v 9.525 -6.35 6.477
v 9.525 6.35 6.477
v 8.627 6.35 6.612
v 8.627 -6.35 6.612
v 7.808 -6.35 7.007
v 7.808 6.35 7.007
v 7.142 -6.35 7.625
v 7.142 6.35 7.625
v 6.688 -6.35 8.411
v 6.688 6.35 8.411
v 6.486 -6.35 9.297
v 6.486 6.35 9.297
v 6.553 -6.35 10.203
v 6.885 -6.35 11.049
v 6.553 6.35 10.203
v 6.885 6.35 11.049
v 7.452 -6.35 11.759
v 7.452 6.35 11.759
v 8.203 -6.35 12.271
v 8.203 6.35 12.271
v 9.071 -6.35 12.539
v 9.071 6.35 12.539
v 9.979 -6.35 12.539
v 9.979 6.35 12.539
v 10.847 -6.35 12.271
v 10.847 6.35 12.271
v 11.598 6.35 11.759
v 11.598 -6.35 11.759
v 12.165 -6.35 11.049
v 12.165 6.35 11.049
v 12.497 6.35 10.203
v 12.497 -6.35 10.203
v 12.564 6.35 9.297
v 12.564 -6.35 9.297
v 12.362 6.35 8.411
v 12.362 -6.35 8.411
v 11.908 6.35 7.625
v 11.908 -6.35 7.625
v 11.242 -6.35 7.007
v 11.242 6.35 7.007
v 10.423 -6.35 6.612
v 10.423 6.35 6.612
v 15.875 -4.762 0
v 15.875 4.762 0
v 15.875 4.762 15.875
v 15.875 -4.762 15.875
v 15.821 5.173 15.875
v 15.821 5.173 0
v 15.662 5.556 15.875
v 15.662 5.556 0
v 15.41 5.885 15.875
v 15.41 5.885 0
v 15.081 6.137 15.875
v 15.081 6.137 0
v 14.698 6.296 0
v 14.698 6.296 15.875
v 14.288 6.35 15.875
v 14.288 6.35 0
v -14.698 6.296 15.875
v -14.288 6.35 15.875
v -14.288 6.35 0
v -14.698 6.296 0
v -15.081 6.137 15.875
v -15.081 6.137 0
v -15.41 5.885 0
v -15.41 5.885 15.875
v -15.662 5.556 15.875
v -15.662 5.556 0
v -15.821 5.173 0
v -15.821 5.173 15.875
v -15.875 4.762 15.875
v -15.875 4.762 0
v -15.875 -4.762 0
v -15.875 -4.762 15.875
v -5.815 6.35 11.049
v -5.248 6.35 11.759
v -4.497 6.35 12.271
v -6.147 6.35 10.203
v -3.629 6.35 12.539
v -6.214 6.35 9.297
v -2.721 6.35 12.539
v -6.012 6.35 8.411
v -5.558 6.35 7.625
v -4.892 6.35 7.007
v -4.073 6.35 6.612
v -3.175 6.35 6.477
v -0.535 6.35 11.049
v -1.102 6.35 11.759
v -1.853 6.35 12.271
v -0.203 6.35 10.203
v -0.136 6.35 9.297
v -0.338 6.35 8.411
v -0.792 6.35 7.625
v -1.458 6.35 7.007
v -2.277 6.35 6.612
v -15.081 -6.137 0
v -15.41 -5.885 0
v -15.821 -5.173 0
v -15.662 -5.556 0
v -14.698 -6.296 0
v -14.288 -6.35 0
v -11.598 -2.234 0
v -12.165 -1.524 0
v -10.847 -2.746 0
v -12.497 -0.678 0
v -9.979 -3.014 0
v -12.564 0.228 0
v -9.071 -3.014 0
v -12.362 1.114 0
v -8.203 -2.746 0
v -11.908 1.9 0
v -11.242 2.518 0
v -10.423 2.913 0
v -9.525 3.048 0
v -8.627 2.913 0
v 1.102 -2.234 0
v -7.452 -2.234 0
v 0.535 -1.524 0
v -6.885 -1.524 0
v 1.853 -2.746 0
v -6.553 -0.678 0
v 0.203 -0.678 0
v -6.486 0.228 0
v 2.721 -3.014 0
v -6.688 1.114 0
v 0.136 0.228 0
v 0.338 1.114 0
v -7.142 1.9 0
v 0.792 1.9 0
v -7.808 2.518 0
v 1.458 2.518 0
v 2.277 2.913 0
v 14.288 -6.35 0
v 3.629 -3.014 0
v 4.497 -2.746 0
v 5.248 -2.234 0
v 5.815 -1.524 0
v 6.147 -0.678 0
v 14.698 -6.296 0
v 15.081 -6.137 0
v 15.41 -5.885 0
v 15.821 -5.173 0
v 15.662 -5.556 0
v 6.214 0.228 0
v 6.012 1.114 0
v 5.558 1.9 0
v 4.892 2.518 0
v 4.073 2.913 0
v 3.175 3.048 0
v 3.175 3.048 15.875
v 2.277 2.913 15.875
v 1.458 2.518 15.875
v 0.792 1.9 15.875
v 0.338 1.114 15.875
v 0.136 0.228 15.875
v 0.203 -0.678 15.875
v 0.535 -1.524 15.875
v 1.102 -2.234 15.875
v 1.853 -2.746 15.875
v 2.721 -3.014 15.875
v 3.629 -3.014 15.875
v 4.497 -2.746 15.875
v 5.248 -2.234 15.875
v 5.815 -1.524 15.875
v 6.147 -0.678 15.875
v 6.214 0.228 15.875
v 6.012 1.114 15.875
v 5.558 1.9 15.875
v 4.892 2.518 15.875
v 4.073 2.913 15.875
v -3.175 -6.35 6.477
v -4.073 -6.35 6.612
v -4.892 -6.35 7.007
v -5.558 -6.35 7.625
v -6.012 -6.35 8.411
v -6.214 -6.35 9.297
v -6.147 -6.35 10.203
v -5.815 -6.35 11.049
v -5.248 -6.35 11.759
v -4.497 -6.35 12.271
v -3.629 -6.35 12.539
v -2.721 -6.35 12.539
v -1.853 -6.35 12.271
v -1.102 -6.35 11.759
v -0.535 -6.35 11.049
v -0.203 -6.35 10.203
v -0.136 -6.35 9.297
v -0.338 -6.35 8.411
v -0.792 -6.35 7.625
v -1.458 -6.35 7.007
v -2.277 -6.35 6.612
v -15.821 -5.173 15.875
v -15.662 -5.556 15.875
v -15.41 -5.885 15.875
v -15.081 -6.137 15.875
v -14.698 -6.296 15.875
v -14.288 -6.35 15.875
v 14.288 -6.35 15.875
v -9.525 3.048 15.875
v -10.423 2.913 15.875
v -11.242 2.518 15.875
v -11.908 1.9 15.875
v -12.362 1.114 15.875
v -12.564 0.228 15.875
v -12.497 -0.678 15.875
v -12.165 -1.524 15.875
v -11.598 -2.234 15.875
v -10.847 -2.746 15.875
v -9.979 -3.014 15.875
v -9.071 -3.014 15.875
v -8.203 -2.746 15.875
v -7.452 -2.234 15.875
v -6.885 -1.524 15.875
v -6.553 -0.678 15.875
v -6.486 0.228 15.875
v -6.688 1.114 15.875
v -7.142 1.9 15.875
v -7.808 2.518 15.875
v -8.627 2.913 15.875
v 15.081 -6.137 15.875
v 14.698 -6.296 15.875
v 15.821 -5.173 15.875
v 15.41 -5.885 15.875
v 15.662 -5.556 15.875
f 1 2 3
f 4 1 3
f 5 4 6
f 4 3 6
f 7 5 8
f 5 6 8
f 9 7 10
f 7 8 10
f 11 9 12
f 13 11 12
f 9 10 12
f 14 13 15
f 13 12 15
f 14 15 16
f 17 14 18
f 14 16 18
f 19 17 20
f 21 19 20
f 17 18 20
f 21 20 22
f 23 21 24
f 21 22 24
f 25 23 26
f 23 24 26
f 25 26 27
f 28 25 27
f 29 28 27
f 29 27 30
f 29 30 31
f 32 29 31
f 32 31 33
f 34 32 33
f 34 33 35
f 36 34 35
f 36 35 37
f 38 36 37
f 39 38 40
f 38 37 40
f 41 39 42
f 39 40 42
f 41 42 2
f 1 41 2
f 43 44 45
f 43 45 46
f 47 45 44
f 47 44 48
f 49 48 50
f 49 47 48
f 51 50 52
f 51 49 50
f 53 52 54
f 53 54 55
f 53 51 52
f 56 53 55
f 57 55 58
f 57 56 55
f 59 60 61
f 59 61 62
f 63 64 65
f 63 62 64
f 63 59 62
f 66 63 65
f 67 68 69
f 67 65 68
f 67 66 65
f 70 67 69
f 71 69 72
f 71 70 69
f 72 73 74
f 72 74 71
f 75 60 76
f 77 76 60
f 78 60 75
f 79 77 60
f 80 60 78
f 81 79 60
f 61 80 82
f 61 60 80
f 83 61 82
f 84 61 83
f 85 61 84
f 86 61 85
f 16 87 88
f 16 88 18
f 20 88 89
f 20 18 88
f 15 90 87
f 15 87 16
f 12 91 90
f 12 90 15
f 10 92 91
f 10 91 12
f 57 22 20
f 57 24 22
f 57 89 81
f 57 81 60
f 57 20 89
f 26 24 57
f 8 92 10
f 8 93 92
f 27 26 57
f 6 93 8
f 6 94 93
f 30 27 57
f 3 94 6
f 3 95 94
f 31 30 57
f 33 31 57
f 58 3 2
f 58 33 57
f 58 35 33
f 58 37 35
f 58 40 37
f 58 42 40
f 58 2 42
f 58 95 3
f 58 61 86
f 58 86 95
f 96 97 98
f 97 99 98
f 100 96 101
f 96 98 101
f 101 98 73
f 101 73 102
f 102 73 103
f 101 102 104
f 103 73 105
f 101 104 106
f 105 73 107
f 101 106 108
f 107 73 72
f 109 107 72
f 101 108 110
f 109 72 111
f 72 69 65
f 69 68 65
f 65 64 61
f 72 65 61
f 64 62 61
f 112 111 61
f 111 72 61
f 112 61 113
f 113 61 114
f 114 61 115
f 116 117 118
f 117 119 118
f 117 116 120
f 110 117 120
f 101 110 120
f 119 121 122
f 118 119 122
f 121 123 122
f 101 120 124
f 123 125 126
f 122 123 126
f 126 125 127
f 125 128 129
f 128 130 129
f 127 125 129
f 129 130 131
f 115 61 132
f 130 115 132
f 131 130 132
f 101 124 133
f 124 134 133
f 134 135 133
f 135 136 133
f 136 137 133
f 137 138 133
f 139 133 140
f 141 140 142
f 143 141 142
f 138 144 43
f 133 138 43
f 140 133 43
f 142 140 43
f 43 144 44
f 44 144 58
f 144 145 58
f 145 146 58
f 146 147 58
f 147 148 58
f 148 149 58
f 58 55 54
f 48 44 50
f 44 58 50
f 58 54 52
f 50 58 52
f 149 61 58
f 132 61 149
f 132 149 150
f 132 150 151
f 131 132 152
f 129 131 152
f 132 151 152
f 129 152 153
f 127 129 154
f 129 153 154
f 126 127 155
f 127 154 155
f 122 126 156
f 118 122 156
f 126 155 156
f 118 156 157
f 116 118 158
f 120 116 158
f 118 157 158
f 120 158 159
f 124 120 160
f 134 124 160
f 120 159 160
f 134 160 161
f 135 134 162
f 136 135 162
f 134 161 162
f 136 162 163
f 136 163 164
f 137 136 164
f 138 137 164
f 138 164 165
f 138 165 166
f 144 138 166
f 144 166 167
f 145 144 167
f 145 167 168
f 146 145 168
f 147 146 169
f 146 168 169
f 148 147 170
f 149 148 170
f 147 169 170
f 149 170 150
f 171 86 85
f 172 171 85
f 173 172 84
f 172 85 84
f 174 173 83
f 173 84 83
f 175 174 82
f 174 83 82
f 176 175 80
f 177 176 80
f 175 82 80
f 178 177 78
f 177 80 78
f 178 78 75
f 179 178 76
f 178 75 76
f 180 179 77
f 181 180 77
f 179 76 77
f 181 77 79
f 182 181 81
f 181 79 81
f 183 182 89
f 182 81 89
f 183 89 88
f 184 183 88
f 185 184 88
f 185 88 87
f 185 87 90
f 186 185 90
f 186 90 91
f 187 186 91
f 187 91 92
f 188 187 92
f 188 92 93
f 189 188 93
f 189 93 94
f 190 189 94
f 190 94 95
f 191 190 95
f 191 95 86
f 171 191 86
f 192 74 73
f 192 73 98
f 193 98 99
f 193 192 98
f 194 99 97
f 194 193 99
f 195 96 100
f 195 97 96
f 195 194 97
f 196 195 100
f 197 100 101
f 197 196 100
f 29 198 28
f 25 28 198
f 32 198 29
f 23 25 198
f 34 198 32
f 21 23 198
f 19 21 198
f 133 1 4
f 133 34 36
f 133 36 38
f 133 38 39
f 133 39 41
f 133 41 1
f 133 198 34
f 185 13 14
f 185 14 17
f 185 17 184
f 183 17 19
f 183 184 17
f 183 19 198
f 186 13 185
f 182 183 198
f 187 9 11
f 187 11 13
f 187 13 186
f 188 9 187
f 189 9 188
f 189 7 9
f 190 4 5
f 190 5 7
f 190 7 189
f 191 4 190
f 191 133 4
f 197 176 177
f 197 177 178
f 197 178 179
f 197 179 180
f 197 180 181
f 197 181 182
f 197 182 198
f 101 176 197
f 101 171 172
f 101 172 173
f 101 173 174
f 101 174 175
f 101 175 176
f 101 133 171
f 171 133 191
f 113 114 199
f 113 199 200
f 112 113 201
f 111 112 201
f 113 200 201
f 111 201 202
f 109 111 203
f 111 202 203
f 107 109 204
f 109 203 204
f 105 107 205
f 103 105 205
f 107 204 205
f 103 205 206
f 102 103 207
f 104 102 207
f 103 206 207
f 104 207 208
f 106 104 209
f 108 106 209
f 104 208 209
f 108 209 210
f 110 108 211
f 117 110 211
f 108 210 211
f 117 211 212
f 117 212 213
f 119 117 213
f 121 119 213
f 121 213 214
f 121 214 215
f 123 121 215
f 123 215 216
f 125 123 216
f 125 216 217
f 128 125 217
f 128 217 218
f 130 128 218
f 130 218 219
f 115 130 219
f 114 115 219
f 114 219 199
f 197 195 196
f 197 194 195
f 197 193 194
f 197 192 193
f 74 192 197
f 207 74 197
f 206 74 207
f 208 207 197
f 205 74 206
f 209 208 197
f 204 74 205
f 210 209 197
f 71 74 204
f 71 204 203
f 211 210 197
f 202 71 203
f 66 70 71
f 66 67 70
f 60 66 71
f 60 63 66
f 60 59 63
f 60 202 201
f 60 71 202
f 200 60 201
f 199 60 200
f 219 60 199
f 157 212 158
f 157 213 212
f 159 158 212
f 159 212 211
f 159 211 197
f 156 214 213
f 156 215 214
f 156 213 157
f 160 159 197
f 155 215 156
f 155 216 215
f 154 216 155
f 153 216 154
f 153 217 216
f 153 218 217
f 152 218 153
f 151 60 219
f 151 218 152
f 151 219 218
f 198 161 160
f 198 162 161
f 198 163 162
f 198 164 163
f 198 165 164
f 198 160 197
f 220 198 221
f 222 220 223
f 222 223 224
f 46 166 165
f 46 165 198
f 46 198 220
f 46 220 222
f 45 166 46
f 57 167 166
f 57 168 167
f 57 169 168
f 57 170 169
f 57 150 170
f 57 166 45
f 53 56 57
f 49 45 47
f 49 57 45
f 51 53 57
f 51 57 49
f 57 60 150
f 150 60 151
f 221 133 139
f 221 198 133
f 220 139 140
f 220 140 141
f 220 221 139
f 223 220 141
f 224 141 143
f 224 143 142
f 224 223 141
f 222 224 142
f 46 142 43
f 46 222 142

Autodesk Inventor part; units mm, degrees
ref_plane "YZ Plane" through (0, 0, 0) normal (1, 0, 0) x (0, 1, 0)
ref_plane "XZ Plane" through (0, 0, 0) normal (0, 1, 0) x (-1, 0, 0)
ref_plane "XY Plane" through (0, 0, 0) normal (0, 0, 1) x (1, 0, 0)
sketch "Sketch1" plane through (0, 0, 0) normal (0, 0, 1) x (1, 0, 0)
  line L0 (15.875, -6.35) -> (-15.875, -6.35)
  line L1 (-15.875, -6.35) -> (-15.875, 6.35)
  line L2 (-15.875, 6.35) -> (15.875, 6.35)
  line L3 (15.875, 6.35) -> (15.875, -6.35)
  line L4 (15.875, -6.35) -> (-15.875, 6.35) construction
  line L5 (-15.875, -6.35) -> (15.875, 6.35) construction
  point P0 (0, 0)
  dimension "d0" = 31.75
  dimension "d1" = 12.7
extrude "Extrusion1" add sketch "Sketch1" along normal blind 15.875
sketch "Sketch2" plane through (0, 0, 0) normal (0, 0, -1) x (-1, 0, 0)
  line L0 (15.875, 6.35) -> (15.875, -6.35) projected
  point P0 (0, 0)
  point P1 (9.525, 0)
  point P2 (-3.175, 0)
  dimension "d4" = 12.7
  dimension "d5" = 6.35
hole "Hole1" at (-9.525, 0, 0) at (3.175, 0, 0) direction (0, 0, 1) diameter 6.096 end through all
sketch "Sketch3" plane through (-15.875, -6.35, 0) normal (0, -1, 0) x (1, 0, 0)
  line L0 (0, 0) -> (0, 15.875) projected
  line L1 (0, 0) -> (31.75, 0) projected
  point P0 (15.875, 0)
  point P1 (12.7, 9.525)
  point P2 (25.4, 9.525)
  dimension "d13" = 12.7
  dimension "d14" = 12.7
  dimension "d15" = 9.525
hole "Hole2" at (-3.175, -6.35, 9.525) at (9.525, -6.35, 9.525) direction (0, 1, 0) diameter 6.096 end through all
fillet "Fillet1" radius 1.5875 4 edges at (-15.875, -6.35, 7.9375) (-15.875, 6.35, 7.9375) (15.875, -6.35, 7.9375) (15.875, 6.35, 7.9375)
properties part number "3DPRINT,LEFT,NUT-BLOCK" material "Nylon 6/6"
